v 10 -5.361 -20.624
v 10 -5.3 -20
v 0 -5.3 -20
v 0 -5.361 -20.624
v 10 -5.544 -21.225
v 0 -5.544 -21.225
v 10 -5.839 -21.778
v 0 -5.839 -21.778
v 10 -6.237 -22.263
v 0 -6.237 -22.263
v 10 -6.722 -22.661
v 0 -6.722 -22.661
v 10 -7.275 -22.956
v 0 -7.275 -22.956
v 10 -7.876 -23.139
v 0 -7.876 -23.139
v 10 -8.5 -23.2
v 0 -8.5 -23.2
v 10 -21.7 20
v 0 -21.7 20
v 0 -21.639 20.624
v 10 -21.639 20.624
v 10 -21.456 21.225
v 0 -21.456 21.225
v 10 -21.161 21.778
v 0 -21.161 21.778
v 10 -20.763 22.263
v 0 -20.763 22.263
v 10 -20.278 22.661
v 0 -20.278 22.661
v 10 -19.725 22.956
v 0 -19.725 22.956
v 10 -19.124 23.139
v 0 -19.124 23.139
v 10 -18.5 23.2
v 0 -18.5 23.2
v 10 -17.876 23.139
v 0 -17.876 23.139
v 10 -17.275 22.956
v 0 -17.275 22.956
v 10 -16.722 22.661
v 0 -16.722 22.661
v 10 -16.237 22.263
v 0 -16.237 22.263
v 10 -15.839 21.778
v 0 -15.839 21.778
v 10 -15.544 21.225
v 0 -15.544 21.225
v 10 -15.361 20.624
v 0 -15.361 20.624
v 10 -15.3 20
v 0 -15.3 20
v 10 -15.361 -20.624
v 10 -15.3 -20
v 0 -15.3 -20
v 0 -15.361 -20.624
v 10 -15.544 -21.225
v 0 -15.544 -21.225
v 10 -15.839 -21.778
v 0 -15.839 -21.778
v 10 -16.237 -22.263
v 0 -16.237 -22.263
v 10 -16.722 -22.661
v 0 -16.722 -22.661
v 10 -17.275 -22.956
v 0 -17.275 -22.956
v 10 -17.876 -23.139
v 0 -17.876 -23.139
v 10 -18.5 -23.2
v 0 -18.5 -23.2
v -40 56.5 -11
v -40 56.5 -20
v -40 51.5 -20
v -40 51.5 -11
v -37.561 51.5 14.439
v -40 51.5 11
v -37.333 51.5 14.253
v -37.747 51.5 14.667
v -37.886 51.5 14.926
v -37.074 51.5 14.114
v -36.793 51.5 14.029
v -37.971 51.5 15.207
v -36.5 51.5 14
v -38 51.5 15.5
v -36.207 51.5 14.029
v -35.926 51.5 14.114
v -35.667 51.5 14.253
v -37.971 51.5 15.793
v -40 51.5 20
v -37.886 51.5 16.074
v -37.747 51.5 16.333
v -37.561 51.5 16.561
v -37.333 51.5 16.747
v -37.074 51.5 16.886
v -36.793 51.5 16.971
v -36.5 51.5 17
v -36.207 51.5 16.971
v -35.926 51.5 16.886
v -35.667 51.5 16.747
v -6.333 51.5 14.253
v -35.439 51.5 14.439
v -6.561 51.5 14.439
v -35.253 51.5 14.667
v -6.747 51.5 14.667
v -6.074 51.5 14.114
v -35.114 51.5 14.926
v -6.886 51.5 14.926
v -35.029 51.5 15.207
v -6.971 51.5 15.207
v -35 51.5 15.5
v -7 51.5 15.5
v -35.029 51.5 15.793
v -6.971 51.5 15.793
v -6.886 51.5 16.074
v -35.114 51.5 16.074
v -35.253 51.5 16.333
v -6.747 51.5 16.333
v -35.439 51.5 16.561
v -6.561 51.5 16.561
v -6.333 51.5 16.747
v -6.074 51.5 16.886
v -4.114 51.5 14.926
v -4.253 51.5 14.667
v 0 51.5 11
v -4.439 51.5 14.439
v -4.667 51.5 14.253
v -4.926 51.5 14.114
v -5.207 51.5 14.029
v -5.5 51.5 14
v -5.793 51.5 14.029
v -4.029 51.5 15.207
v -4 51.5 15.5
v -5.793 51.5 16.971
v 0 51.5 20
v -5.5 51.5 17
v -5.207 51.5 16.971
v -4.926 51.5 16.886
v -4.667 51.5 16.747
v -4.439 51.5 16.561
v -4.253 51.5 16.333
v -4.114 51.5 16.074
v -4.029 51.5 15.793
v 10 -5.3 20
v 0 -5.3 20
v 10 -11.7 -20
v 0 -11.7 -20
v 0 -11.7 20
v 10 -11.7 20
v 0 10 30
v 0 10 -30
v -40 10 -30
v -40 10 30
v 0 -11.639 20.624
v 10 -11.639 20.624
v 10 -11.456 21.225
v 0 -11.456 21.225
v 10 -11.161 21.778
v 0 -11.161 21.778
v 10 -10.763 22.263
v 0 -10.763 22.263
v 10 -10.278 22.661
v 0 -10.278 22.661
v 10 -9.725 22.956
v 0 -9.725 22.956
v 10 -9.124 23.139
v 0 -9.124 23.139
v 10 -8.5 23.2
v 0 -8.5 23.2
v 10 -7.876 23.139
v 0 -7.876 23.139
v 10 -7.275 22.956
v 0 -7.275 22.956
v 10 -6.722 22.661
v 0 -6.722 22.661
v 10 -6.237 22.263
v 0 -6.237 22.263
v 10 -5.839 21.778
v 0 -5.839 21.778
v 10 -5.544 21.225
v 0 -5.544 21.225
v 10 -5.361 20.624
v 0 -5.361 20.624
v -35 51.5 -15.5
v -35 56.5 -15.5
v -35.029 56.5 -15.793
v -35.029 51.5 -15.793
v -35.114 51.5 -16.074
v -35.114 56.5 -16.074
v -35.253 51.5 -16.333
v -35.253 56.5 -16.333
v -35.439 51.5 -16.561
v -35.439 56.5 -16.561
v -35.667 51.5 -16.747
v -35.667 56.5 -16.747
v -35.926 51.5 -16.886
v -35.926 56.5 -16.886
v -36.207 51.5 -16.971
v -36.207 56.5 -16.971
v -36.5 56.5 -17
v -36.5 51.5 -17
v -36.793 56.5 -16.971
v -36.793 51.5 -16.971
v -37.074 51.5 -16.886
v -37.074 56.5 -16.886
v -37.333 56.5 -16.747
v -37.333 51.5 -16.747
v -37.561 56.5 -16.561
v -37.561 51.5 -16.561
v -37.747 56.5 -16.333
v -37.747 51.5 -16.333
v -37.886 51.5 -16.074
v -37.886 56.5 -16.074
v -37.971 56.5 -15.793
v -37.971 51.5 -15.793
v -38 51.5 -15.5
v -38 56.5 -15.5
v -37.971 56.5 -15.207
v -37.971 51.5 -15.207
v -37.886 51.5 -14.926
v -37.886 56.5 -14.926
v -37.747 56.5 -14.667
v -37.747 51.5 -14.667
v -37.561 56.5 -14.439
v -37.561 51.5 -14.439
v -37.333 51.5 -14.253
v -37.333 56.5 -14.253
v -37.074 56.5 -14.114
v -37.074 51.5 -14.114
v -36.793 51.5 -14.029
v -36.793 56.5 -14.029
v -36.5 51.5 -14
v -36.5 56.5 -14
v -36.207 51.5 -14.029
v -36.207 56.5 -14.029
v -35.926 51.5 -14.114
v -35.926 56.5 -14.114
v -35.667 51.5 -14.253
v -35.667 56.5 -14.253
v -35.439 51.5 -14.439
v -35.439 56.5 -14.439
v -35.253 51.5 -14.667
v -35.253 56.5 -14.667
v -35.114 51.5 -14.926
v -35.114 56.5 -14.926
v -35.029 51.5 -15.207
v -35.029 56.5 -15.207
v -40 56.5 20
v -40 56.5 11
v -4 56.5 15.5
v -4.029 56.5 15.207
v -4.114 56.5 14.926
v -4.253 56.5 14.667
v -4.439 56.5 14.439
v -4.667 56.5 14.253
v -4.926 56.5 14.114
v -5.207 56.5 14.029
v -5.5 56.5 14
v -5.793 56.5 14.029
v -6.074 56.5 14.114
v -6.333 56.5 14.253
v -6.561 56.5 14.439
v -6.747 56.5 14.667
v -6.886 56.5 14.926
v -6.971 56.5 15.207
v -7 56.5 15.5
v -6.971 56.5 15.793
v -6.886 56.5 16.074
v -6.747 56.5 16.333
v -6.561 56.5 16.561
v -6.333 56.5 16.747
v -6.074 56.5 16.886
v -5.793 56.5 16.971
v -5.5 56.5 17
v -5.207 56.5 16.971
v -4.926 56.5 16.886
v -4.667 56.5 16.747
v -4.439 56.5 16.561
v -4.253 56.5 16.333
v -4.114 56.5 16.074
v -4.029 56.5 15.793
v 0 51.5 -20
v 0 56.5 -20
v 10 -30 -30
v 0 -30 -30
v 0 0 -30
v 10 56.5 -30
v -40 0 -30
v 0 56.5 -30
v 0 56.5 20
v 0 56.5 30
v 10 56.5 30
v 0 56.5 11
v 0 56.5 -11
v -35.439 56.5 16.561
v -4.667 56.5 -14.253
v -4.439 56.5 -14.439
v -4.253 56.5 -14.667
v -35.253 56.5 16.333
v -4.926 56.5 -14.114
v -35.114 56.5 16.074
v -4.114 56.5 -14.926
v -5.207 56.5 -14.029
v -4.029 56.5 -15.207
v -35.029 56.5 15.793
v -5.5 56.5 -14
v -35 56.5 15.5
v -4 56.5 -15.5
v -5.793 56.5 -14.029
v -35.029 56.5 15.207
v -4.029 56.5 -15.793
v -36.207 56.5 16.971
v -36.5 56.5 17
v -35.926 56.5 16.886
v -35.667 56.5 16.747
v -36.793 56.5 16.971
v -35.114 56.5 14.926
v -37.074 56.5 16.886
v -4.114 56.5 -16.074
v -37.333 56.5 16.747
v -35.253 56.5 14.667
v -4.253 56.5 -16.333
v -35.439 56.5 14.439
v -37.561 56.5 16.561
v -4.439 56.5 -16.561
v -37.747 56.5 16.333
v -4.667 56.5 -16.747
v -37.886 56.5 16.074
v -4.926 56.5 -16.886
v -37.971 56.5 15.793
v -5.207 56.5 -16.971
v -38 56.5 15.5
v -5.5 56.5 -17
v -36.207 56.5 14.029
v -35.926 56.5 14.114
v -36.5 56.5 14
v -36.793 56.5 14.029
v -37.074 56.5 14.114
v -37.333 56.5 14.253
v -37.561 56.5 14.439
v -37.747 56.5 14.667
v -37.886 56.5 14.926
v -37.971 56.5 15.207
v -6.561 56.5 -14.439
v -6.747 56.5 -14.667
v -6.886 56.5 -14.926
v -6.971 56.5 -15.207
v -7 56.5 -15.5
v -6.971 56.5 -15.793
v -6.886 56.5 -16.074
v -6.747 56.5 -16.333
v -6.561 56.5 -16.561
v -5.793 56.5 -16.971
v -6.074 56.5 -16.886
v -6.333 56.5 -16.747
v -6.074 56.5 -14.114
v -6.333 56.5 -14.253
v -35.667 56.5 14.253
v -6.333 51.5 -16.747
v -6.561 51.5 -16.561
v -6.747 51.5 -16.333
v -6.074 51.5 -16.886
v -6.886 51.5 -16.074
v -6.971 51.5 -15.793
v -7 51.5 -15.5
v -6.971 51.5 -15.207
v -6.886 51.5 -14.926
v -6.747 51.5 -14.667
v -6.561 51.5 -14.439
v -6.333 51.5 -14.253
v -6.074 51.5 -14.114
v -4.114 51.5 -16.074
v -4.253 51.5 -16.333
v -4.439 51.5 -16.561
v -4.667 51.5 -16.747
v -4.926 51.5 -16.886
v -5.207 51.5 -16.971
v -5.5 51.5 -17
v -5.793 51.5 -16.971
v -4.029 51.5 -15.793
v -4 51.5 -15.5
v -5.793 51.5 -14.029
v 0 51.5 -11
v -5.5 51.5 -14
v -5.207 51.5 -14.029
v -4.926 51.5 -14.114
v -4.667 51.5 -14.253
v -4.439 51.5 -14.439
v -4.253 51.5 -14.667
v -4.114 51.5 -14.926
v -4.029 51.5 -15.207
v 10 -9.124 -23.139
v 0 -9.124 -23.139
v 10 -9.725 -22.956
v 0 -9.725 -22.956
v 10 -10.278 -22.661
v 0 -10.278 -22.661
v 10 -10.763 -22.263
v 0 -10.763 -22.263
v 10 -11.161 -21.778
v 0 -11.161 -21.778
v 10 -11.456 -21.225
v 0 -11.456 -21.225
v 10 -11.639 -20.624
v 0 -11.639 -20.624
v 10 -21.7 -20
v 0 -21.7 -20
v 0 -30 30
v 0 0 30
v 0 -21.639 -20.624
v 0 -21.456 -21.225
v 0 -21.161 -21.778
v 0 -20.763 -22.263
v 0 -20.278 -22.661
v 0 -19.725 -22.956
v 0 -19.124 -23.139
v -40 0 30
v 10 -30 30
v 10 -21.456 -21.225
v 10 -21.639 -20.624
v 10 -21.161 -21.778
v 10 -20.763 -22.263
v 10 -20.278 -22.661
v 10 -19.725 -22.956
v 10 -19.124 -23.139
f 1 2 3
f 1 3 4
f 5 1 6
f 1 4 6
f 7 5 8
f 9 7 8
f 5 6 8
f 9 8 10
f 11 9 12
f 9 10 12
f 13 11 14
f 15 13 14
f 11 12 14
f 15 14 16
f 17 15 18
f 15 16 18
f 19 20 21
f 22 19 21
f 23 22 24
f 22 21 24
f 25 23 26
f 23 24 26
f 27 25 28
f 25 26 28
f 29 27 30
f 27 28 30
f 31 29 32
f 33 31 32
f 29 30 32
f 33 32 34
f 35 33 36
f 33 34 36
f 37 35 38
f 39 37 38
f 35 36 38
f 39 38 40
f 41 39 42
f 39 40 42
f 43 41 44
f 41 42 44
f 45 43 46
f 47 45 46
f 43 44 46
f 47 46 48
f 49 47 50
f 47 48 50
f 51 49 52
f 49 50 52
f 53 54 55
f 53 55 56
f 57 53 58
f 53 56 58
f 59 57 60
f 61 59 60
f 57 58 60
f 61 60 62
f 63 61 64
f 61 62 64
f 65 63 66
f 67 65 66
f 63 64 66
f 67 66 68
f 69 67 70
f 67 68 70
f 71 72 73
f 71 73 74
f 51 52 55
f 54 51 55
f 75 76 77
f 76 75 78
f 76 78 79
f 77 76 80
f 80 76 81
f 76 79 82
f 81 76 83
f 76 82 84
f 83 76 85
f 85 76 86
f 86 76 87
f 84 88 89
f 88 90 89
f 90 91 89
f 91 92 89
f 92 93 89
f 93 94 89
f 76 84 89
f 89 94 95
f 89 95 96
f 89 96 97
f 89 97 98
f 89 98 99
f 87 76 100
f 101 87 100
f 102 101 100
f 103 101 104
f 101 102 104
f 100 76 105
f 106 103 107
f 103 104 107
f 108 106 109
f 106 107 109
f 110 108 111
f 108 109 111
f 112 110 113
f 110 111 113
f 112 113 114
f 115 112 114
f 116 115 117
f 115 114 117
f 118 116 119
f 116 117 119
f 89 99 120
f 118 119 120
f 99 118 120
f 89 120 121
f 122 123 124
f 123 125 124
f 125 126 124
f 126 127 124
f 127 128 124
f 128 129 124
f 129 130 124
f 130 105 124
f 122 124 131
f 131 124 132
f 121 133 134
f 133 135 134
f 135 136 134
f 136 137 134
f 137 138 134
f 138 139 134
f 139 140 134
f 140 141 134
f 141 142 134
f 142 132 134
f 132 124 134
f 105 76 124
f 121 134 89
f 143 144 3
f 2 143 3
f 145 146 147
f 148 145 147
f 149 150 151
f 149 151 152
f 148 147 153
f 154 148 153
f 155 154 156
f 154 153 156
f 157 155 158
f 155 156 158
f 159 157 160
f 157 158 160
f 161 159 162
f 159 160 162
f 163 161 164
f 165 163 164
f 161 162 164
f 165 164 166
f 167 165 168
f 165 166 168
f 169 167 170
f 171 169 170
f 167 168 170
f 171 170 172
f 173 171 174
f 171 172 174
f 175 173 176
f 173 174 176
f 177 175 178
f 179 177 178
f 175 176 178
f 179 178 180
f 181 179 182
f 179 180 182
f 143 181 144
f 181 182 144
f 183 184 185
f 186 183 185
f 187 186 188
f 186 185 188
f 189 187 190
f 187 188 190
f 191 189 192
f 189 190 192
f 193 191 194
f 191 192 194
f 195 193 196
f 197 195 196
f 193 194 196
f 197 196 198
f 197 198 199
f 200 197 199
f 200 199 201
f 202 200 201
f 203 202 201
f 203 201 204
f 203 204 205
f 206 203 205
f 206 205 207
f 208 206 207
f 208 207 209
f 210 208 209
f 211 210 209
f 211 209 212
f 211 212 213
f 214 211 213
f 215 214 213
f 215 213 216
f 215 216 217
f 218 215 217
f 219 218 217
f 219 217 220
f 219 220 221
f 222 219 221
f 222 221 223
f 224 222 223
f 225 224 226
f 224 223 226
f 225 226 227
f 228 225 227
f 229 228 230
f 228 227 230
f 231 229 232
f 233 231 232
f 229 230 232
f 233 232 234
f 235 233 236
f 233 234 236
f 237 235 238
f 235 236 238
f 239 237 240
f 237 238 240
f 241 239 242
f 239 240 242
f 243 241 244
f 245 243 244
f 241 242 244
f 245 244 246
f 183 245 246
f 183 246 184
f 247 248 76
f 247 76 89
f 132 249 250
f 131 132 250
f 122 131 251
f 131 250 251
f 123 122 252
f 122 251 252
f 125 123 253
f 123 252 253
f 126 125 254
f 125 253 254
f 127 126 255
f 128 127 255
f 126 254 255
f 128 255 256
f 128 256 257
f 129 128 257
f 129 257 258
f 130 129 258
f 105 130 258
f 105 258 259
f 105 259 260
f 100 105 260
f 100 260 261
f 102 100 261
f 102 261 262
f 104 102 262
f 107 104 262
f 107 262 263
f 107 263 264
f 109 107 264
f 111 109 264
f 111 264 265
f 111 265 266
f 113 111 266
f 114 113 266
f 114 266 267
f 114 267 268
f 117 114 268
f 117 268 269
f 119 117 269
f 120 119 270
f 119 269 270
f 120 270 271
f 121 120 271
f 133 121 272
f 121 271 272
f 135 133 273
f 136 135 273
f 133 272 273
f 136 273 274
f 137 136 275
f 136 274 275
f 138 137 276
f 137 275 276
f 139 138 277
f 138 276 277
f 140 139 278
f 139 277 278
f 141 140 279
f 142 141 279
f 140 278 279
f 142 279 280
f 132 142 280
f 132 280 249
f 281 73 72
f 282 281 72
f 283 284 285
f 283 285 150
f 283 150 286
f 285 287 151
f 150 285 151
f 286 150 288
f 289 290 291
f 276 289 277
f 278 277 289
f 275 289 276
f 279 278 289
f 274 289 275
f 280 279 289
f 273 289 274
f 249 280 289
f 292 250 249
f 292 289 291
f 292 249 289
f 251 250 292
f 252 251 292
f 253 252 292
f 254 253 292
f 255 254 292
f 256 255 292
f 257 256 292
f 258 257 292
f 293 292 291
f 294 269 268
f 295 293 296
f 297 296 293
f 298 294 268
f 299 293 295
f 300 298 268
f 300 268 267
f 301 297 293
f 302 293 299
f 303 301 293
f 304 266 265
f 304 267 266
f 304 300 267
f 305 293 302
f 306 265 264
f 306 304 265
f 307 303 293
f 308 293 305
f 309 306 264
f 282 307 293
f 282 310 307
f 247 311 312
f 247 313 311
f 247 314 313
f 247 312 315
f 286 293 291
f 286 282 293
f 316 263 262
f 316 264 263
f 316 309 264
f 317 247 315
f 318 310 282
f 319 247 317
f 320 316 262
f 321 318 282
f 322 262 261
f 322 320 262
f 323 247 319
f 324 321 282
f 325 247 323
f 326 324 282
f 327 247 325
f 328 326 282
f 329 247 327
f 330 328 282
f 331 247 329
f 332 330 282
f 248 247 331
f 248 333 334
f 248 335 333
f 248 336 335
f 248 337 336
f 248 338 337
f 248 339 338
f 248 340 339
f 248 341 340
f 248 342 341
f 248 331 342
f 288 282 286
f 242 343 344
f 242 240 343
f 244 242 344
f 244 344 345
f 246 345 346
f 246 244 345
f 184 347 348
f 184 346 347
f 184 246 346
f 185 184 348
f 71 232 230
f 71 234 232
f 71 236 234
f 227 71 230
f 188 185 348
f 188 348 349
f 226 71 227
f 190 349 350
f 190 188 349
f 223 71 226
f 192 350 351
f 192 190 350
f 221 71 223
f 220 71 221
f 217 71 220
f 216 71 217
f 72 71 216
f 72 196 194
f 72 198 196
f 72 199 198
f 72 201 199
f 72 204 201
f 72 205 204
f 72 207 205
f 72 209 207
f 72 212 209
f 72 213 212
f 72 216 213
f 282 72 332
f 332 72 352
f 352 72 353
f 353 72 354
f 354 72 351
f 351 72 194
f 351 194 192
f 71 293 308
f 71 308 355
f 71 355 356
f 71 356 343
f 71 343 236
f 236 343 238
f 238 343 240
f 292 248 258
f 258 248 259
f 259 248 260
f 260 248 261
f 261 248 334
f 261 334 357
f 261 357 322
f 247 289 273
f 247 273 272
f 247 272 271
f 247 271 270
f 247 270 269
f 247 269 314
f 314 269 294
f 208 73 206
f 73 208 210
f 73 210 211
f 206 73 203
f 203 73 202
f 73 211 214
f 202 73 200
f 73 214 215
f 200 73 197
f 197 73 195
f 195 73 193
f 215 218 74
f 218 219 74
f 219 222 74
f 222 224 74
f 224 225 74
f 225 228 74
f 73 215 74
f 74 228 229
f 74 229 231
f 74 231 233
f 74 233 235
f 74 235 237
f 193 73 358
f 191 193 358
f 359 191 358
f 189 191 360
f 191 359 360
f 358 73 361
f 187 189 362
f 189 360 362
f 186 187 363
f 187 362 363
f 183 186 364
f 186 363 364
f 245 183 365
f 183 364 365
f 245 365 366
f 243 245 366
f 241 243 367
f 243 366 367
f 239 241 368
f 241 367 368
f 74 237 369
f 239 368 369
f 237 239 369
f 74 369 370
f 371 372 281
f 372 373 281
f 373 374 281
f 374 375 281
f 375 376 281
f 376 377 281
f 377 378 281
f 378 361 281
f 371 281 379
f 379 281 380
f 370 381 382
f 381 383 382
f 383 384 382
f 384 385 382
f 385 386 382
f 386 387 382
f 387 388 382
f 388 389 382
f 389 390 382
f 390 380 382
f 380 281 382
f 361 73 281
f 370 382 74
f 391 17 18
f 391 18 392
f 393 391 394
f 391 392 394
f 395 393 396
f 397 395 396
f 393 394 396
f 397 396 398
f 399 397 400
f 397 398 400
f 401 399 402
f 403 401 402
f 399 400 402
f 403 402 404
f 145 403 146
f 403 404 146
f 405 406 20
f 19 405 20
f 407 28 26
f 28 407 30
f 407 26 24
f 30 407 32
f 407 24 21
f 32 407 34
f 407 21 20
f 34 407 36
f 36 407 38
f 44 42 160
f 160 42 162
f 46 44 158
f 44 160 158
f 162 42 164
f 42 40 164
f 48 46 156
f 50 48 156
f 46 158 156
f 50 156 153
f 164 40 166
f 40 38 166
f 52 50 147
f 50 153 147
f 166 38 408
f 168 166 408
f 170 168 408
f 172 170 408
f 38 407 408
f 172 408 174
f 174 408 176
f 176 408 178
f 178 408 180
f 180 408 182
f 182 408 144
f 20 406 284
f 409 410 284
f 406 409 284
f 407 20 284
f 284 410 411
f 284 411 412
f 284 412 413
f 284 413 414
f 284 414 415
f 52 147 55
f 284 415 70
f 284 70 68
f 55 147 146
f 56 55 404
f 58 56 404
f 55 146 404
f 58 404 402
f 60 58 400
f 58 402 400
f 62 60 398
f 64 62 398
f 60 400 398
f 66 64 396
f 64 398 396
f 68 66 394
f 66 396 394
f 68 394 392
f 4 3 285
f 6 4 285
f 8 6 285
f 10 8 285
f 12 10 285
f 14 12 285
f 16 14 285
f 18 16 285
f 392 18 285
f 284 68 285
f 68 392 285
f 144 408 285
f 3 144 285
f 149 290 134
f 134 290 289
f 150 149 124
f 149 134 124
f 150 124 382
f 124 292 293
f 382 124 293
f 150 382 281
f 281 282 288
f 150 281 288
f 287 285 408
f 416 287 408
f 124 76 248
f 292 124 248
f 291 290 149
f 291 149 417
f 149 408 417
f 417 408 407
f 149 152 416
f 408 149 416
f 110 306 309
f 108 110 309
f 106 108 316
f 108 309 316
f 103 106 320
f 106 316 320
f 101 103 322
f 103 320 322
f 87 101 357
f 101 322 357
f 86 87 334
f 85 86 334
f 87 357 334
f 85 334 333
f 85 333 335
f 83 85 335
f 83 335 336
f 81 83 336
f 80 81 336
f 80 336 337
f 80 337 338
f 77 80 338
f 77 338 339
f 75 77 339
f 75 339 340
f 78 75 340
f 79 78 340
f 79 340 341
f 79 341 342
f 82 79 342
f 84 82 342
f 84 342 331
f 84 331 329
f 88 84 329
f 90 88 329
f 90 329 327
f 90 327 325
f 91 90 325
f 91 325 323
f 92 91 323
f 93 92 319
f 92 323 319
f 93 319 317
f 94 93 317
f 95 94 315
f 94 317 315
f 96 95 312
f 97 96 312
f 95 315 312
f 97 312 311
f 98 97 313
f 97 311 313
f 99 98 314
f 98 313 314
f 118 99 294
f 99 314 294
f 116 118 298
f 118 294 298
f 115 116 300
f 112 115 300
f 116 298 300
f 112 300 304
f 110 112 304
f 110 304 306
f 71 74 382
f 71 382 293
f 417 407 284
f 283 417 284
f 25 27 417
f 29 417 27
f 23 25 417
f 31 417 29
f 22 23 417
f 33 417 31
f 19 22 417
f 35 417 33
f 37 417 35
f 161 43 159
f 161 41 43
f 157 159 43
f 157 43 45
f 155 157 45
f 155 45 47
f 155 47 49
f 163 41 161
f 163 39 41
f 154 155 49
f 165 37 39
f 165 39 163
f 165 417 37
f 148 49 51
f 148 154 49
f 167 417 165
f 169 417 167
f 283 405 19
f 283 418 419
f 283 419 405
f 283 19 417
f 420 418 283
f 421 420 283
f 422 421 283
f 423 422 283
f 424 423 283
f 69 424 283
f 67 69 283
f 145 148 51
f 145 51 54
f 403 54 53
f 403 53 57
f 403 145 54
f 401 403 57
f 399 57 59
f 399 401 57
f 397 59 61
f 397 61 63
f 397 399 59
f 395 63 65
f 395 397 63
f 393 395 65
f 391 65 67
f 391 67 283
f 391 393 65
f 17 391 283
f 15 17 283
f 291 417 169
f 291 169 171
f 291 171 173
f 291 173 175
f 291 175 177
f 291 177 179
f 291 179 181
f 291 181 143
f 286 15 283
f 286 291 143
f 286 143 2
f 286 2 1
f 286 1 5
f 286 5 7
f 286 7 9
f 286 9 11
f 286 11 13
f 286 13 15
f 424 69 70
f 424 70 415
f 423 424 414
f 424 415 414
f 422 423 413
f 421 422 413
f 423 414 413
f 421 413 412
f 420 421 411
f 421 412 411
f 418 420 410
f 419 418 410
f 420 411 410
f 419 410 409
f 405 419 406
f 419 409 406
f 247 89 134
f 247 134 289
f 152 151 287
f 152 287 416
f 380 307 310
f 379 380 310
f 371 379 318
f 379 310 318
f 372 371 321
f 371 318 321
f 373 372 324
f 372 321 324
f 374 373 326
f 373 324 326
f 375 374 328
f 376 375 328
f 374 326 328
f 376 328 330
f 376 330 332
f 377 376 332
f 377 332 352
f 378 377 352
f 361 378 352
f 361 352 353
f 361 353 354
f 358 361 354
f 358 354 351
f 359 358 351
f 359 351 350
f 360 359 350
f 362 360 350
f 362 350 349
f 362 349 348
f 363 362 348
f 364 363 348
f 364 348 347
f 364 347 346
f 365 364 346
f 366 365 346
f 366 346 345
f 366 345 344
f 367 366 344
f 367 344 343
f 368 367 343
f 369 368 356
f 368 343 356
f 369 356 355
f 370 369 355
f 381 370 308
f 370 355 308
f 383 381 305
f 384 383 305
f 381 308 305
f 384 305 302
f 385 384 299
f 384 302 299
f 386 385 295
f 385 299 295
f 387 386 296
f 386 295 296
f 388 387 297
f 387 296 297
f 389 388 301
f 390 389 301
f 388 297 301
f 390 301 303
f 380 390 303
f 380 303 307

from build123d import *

# Parameters (mm, degrees)
SKETCH1_W           = 60
SKETCH1_H           = 56.5
SKETCH1_H_2         = 30
BOSS_EXTRUDE1_DEPTH = 10
SKETCH3_W           = 60
SKETCH3_H           = 10
BOSS_EXTRUDE2_DEPTH = 40
SKETCH4_W           = 9
SKETCH4_H           = 5
BOSS_EXTRUDE3_DEPTH = 40
CUT_EXTRUDE1_REACH  = 88.5
SKETCH5_R           = 1.5


with BuildPart() as part:
    # Sketch1 → Boss-Extrude1 (new body)
    with BuildSketch(Plane(origin=(0, 0, 0), x_dir=(0, 0, -1), z_dir=(1, 0, 0))):
        with Locations((0, 28.25)):
            Rectangle(SKETCH1_W, SKETCH1_H)
        with Locations((0, -15)):
            Rectangle(SKETCH1_W, SKETCH1_H_2)
        with BuildLine():
            ThreePointArc((-20, -21.7), (-23.2, -18.5), (-20, -15.3))
            Line((-20, -15.3), (20, -15.3))
            ThreePointArc((20, -15.3), (22.2627417, -16.2372583), (23.2, -18.5))
            ThreePointArc((23.2, -18.5), (22.2627417, -20.7627417), (20, -21.7))
            Line((20, -21.7), (-20, -21.7))
        make_face(mode=Mode.SUBTRACT)
        with BuildLine():
            ThreePointArc((-20, -11.7), (-23.2, -8.5), (-20, -5.3))
            Line((-20, -5.3), (20, -5.3))
            ThreePointArc((20, -5.3), (22.2627417, -6.2372583), (23.2, -8.5))
            ThreePointArc((23.2, -8.5), (22.2627417, -10.7627417), (20, -11.7))
            Line((20, -11.7), (-20, -11.7))
        make_face(mode=Mode.SUBTRACT)
    extrude(amount=BOSS_EXTRUDE1_DEPTH)

    # Sketch3 → Boss-Extrude2 (add)
    with BuildSketch(Plane.ZY):
        with Locations((0, 5)):
            Rectangle(SKETCH3_W, SKETCH3_H)
    extrude(amount=BOSS_EXTRUDE2_DEPTH)

    # Sketch4 → Boss-Extrude3 (add)
    with BuildSketch(Plane.ZY):
        with Locations((-15.5, 54)):
            Rectangle(SKETCH4_W, SKETCH4_H)
        with Locations((15.5, 54)):
            Rectangle(SKETCH4_W, SKETCH4_H)
    extrude(amount=BOSS_EXTRUDE3_DEPTH)

    # Sketch5 → Cut-Extrude1 (cut, up to next)
    with BuildSketch(Plane(origin=(0, 56.5, 0), x_dir=(1, 0, 0), z_dir=(0, 1, 0)), mode=Mode.PRIVATE) as cut_extrude1_sk1:
        with Locations((-5.5, 15.5)):
            Circle(SKETCH5_R)
    cut_extrude1_tool1 = extrude(cut_extrude1_sk1.sketch, amount=-CUT_EXTRUDE1_REACH, mode=Mode.PRIVATE) & part.part
    add(cut_extrude1_tool1.solids().sort_by_distance((-5.5, 56.5, -15.5))[0], mode=Mode.SUBTRACT)
    # Sketch5 → Cut-Extrude1 (cut, up to next)
    with BuildSketch(Plane(origin=(0, 56.5, 0), x_dir=(1, 0, 0), z_dir=(0, 1, 0)), mode=Mode.PRIVATE) as cut_extrude1_sk2:
        with Locations((-36.5, 15.5)):
            Circle(SKETCH5_R)
    cut_extrude1_tool2 = extrude(cut_extrude1_sk2.sketch, amount=-CUT_EXTRUDE1_REACH, mode=Mode.PRIVATE) & part.part
    add(cut_extrude1_tool2.solids().sort_by_distance((-36.5, 56.5, -15.5))[0], mode=Mode.SUBTRACT)
    # Sketch5 → Cut-Extrude1 (cut, up to next)
    with BuildSketch(Plane(origin=(0, 56.5, 0), x_dir=(1, 0, 0), z_dir=(0, 1, 0)), mode=Mode.PRIVATE) as cut_extrude1_sk3:
        with Locations((-5.5, -15.5)):
            Circle(SKETCH5_R)
    cut_extrude1_tool3 = extrude(cut_extrude1_sk3.sketch, amount=-CUT_EXTRUDE1_REACH, mode=Mode.PRIVATE) & part.part
    add(cut_extrude1_tool3.solids().sort_by_distance((-5.5, 56.5, 15.5))[0], mode=Mode.SUBTRACT)
    # Sketch5 → Cut-Extrude1 (cut, up to next)
    with BuildSketch(Plane(origin=(0, 56.5, 0), x_dir=(1, 0, 0), z_dir=(0, 1, 0)), mode=Mode.PRIVATE) as cut_extrude1_sk4:
        with Locations((-36.5, -15.5)):
            Circle(SKETCH5_R)
    cut_extrude1_tool4 = extrude(cut_extrude1_sk4.sketch, amount=-CUT_EXTRUDE1_REACH, mode=Mode.PRIVATE) & part.part
    add(cut_extrude1_tool4.solids().sort_by_distance((-36.5, 56.5, 15.5))[0], mode=Mode.SUBTRACT)


solid = part.part
